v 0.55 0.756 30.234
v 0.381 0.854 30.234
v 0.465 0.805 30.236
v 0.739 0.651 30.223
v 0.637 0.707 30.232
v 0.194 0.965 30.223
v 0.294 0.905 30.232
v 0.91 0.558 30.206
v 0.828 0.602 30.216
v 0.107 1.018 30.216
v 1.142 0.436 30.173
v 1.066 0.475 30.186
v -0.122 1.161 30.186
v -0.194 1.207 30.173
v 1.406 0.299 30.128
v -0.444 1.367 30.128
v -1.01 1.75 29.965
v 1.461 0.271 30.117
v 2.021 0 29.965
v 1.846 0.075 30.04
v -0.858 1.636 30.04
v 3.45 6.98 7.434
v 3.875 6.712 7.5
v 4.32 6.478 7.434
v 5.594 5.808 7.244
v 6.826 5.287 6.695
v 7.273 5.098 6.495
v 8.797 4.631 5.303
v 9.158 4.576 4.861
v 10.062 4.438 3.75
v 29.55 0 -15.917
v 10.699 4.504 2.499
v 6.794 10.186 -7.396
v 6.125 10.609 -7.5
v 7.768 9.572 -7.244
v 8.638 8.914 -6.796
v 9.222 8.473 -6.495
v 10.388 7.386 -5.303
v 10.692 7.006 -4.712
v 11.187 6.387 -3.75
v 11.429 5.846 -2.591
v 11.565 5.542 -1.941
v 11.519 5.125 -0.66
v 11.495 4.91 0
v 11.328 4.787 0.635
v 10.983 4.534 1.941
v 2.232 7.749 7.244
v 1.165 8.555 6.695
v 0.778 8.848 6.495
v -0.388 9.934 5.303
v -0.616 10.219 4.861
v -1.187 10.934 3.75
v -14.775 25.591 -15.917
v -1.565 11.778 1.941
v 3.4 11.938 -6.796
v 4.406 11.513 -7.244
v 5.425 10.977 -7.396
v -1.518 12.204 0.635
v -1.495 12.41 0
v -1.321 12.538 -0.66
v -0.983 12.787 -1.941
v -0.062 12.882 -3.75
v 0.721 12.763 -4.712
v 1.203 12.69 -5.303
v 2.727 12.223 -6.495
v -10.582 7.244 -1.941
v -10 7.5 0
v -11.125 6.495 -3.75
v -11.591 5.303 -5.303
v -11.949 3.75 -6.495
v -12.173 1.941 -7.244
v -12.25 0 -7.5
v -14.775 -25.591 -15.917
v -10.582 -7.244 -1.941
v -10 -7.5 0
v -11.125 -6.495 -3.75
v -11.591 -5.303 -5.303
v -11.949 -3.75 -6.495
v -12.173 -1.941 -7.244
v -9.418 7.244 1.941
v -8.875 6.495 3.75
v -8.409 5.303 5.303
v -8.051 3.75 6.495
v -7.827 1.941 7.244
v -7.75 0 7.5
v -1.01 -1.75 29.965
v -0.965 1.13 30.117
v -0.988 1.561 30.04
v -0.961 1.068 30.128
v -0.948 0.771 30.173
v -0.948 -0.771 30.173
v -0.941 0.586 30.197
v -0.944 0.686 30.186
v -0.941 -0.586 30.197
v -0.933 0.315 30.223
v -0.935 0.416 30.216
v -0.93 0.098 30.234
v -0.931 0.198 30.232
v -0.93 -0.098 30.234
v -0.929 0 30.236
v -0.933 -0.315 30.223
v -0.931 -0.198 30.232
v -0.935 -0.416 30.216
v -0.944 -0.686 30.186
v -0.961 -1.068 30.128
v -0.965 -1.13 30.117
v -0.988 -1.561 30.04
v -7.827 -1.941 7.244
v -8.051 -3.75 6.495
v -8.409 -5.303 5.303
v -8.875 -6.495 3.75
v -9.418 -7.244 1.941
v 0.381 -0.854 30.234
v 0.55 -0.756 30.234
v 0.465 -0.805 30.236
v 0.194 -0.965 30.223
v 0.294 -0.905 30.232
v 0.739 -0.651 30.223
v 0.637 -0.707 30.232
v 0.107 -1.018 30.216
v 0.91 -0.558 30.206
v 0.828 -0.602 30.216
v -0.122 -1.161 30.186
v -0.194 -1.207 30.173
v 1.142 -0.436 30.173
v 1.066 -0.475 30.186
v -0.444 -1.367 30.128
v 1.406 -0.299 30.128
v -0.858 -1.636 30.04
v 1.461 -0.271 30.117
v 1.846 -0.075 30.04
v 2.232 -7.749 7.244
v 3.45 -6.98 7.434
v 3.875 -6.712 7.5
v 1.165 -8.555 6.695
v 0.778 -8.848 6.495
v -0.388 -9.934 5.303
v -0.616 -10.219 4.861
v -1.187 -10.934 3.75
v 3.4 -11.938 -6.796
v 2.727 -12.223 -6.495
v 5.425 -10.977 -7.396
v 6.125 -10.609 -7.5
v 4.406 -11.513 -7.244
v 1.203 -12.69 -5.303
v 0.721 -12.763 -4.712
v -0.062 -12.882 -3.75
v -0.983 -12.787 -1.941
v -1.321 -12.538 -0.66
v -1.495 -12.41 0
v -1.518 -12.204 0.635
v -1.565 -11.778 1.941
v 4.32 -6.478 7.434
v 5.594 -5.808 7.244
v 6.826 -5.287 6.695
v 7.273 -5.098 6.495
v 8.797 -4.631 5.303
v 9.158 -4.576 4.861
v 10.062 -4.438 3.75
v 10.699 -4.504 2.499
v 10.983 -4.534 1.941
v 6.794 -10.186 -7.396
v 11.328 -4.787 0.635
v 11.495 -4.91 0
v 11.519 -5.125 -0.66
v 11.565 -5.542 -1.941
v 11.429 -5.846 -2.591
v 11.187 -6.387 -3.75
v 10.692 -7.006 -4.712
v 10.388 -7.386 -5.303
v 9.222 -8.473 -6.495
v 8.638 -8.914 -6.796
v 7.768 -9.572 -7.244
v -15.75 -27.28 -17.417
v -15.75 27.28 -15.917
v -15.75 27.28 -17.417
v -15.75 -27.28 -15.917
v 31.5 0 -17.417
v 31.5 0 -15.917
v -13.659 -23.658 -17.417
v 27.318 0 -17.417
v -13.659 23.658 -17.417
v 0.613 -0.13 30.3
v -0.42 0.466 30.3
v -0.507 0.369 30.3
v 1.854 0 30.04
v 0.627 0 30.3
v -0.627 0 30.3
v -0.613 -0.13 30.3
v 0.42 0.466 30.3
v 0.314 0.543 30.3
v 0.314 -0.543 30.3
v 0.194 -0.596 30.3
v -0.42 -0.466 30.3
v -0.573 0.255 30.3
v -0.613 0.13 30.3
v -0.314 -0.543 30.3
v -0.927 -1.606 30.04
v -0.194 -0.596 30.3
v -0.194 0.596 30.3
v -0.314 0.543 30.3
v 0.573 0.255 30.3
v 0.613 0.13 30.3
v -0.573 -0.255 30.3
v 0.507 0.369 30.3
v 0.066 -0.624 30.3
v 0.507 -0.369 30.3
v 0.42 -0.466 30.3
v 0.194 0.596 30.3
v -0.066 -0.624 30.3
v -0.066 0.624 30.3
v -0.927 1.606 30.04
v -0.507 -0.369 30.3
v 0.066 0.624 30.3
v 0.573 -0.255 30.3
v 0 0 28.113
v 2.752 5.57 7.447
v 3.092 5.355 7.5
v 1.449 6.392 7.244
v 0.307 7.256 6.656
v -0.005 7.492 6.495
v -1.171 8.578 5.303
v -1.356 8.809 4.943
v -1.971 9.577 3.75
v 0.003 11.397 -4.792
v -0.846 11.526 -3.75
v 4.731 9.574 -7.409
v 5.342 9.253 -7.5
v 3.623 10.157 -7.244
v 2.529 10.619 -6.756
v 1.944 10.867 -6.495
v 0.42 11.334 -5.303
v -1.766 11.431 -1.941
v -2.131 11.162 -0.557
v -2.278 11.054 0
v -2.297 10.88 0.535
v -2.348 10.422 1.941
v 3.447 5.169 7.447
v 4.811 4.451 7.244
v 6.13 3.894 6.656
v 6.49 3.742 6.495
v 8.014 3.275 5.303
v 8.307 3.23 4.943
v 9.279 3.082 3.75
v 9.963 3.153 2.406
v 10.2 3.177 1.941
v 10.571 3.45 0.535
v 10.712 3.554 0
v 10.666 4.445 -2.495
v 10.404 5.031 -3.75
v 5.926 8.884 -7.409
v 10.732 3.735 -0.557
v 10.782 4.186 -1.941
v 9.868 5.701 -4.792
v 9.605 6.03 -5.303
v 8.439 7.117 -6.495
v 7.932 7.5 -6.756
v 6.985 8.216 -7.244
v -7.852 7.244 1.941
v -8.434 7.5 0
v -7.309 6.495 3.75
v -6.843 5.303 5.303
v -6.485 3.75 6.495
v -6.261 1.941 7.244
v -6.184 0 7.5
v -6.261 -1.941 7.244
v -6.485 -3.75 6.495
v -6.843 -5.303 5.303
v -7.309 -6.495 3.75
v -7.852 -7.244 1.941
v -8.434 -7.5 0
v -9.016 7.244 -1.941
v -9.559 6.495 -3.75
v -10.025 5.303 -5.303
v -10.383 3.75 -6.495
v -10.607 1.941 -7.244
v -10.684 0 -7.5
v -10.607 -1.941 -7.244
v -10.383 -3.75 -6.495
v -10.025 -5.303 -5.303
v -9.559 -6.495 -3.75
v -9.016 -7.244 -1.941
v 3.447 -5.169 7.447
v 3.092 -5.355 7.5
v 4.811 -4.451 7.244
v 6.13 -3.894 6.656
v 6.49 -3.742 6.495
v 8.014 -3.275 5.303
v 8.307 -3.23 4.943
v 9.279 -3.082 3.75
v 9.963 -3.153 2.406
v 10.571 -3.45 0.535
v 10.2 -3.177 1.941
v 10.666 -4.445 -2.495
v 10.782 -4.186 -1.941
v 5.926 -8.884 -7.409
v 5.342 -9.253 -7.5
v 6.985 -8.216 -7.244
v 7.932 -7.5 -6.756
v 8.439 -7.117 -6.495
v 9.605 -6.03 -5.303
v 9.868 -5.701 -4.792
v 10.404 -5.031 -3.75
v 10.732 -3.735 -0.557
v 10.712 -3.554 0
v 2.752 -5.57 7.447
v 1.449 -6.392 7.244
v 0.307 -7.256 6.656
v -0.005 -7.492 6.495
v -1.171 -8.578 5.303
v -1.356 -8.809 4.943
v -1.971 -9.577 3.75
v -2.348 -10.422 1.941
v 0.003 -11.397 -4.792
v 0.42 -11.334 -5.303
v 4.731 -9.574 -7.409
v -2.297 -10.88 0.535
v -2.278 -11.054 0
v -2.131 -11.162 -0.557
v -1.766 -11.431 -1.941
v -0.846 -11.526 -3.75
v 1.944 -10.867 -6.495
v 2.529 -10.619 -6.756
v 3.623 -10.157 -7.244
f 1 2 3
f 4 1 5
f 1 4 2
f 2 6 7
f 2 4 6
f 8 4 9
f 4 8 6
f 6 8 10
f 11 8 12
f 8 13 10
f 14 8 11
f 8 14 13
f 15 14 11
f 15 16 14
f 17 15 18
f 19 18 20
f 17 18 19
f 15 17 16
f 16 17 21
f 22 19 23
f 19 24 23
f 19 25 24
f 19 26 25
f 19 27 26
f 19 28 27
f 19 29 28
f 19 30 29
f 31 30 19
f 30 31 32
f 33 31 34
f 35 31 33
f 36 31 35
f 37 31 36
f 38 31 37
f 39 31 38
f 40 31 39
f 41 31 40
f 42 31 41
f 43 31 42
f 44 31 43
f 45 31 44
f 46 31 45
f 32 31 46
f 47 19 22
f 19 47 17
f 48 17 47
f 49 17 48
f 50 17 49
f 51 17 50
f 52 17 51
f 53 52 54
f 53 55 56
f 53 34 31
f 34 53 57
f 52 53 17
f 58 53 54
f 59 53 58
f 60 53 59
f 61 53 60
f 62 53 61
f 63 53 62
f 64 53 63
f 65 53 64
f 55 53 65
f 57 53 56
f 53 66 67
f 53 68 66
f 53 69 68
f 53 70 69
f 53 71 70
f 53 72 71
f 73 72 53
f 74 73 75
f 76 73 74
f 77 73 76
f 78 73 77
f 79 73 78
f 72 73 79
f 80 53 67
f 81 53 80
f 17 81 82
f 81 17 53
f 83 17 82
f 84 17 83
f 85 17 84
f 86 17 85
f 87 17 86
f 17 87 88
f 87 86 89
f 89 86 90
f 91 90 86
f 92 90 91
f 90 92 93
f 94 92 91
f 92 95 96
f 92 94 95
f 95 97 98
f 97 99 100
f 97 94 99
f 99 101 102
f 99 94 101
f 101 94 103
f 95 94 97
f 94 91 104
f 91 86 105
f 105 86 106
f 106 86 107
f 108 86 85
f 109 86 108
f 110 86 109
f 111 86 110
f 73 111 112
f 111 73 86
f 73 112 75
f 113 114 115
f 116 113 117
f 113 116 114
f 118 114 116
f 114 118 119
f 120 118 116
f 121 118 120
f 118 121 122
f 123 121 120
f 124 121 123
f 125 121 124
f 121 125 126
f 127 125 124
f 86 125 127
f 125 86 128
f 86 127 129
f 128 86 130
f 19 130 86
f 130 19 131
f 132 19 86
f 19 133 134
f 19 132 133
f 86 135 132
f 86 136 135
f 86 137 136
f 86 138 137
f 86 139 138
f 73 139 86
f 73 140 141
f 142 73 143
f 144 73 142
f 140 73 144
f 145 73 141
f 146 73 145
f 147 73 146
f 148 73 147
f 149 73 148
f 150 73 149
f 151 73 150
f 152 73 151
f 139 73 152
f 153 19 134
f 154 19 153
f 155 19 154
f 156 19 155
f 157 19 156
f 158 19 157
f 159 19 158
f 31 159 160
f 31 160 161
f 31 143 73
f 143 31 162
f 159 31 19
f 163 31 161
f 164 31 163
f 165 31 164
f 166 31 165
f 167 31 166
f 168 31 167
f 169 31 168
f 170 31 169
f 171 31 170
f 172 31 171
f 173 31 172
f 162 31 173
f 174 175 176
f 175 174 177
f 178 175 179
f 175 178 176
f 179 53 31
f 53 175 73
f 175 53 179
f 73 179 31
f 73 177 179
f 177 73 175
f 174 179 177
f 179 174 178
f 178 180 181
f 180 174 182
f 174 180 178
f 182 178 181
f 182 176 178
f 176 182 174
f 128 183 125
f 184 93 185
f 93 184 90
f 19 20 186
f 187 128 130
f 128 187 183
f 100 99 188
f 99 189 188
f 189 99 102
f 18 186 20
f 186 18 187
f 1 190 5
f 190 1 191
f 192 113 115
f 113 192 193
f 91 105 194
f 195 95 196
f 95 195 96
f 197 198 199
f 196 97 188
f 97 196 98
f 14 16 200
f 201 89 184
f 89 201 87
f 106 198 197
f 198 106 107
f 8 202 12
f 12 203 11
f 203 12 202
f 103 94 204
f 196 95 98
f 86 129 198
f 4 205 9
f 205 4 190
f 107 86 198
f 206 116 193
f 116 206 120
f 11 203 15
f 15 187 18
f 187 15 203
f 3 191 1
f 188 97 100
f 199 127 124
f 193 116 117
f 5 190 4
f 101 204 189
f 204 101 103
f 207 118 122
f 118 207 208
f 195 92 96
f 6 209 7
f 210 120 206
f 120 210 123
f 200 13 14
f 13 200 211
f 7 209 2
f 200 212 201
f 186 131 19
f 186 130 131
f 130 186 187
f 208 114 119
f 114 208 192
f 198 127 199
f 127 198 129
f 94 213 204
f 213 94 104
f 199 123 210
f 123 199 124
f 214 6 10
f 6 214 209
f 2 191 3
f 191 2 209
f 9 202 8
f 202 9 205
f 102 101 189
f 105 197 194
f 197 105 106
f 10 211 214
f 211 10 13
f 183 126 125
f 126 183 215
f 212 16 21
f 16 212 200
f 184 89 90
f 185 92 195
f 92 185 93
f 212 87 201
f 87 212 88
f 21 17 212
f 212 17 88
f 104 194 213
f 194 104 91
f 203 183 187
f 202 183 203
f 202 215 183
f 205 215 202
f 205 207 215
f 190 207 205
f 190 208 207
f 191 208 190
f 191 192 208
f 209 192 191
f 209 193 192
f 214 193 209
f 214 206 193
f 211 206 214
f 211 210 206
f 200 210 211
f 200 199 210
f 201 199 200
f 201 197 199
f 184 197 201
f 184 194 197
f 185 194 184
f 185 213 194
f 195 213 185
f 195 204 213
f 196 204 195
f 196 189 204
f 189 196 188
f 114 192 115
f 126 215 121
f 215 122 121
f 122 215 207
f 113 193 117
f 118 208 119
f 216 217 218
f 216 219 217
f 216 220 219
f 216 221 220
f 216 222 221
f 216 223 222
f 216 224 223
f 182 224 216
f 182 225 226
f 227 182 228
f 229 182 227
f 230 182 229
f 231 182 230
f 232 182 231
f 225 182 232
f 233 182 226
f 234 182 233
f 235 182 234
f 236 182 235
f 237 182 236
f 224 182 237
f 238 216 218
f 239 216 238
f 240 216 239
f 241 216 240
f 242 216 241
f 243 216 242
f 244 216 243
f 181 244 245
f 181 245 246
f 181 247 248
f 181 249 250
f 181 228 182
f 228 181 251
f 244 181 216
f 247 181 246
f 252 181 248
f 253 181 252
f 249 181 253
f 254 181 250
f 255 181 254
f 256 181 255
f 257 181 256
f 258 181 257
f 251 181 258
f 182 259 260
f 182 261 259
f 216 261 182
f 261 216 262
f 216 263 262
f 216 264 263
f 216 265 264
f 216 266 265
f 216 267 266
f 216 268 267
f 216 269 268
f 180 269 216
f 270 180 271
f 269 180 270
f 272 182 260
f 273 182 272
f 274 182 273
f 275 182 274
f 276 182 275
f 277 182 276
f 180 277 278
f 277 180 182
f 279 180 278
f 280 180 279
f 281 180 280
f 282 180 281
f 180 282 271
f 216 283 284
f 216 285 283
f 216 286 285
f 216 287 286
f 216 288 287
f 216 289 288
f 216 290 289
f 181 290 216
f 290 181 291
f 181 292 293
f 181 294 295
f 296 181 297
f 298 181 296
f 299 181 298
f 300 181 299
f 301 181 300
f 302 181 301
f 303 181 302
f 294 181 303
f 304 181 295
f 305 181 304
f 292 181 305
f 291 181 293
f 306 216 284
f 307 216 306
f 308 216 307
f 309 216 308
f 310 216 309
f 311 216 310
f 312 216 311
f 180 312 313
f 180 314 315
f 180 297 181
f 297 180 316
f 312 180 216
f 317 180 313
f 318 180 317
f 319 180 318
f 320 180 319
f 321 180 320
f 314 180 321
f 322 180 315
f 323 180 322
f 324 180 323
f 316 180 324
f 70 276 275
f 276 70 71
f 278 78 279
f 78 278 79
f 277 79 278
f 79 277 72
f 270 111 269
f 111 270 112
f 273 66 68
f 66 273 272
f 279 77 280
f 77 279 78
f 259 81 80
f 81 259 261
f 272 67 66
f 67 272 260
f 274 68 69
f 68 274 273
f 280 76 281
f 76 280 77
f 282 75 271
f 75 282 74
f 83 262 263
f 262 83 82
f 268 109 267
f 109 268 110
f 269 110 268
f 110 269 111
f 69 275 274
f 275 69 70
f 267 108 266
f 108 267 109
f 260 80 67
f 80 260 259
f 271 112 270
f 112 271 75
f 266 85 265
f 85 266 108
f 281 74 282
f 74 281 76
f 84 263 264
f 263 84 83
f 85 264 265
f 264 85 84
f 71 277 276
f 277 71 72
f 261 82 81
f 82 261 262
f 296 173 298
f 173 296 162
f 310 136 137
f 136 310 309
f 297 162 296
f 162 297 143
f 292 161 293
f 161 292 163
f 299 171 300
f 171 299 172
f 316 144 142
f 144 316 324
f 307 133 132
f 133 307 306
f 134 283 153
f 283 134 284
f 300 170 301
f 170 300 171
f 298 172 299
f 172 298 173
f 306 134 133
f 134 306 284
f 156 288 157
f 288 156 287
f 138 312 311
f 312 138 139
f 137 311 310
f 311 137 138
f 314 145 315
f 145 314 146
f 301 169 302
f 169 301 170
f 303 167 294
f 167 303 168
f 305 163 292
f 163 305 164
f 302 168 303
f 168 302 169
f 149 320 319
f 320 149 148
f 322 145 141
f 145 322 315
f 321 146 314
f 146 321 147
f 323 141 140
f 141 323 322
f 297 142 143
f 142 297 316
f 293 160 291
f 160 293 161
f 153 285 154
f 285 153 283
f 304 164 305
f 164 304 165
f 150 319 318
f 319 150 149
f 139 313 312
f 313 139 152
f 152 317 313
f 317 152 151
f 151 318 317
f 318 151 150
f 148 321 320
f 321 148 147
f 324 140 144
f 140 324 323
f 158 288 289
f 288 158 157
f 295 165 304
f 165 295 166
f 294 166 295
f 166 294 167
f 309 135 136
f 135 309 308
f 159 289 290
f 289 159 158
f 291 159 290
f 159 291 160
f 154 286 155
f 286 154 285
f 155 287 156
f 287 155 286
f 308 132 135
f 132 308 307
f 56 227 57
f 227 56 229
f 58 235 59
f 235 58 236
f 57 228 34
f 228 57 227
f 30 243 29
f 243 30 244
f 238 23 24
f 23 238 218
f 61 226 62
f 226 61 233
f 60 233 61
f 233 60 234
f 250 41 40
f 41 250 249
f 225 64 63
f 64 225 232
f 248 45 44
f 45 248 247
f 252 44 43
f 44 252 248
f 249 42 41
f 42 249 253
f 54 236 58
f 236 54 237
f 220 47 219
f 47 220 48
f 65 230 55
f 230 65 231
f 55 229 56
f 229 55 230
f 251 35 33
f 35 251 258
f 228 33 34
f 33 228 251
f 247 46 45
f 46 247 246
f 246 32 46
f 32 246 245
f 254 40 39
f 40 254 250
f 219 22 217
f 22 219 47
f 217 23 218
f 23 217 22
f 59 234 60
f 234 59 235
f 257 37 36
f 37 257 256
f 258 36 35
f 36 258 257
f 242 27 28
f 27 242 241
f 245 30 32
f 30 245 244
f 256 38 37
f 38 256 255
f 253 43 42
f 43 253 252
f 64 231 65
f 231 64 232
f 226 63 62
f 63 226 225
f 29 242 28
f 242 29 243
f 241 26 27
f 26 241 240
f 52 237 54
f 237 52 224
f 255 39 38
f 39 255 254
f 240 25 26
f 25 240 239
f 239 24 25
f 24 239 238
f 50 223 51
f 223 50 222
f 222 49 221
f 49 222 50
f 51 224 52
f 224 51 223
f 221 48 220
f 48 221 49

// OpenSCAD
// created by: Michael McWethy 2019
// You can use this design anyway you want for personal use.  You need permission from me for commercial use.

// The following OpenScad program creates one stackable Painter's Triangle that elevates an object with as little 
// contact as possible.

base_r = 30;        // circle radius that touches base triagle points
triangle_h = 50;    // height of the painter's triangle
skin = 1.5;         // thickness of the painter's triangle walls
bluntness = 3;    // how much of the top to round off

hole_r = min(base_r,triangle_h)/4;  // calculate the size of the side holes
hole_h = base_r;    // length of hole cutter

side_angle = atan(triangle_h/(base_r/2)); // angle at middle of one side to top point
triangle_cutter_difference = skin/cos(side_angle);  // distance for cutter to get proper skin thickness

echo ("side_angle=",side_angle);
echo("triangle_cutter_difference=",triangle_cutter_difference);

// create main body with holes.
difference(){
    // move the main body for hole placement
    translate([0, 0, triangle_h/3/2]) {
        // create the main body with proper wall thickness
        difference(){
            // create a solid pyramid with a base brim
            union(){
                cylinder(triangle_h, base_r, 0, $fn=3, center=true);
                translate([0,0,-triangle_h/2]) cylinder(r=base_r+skin, h=skin, center=true, $fn=3);
            }
            // cut out the inside with a cutter with same shape, but translated by calculated
            // distance to ensure proper wall thickness
            translate([0,0,-triangle_cutter_difference])cylinder(triangle_h, base_r, 0, $fn=3, center=true);
            // blunt the top
            translate([0,0,(triangle_h/2)-3*bluntness]) difference(){
                cylinder(r=bluntness*2, h=3*bluntness, $fn=20);
                sphere(r=bluntness*2,$fn=30);
            }
        }        
    }
    // create three cylinder cutters, emanating from the origin point
    rotate([0,90,180])cylinder(r=hole_r, h=hole_h);
    rotate([0,90,-60])cylinder(r=hole_r, h=hole_h);
    rotate([0,90, 60])cylinder(r=hole_r, h=hole_h);
}
